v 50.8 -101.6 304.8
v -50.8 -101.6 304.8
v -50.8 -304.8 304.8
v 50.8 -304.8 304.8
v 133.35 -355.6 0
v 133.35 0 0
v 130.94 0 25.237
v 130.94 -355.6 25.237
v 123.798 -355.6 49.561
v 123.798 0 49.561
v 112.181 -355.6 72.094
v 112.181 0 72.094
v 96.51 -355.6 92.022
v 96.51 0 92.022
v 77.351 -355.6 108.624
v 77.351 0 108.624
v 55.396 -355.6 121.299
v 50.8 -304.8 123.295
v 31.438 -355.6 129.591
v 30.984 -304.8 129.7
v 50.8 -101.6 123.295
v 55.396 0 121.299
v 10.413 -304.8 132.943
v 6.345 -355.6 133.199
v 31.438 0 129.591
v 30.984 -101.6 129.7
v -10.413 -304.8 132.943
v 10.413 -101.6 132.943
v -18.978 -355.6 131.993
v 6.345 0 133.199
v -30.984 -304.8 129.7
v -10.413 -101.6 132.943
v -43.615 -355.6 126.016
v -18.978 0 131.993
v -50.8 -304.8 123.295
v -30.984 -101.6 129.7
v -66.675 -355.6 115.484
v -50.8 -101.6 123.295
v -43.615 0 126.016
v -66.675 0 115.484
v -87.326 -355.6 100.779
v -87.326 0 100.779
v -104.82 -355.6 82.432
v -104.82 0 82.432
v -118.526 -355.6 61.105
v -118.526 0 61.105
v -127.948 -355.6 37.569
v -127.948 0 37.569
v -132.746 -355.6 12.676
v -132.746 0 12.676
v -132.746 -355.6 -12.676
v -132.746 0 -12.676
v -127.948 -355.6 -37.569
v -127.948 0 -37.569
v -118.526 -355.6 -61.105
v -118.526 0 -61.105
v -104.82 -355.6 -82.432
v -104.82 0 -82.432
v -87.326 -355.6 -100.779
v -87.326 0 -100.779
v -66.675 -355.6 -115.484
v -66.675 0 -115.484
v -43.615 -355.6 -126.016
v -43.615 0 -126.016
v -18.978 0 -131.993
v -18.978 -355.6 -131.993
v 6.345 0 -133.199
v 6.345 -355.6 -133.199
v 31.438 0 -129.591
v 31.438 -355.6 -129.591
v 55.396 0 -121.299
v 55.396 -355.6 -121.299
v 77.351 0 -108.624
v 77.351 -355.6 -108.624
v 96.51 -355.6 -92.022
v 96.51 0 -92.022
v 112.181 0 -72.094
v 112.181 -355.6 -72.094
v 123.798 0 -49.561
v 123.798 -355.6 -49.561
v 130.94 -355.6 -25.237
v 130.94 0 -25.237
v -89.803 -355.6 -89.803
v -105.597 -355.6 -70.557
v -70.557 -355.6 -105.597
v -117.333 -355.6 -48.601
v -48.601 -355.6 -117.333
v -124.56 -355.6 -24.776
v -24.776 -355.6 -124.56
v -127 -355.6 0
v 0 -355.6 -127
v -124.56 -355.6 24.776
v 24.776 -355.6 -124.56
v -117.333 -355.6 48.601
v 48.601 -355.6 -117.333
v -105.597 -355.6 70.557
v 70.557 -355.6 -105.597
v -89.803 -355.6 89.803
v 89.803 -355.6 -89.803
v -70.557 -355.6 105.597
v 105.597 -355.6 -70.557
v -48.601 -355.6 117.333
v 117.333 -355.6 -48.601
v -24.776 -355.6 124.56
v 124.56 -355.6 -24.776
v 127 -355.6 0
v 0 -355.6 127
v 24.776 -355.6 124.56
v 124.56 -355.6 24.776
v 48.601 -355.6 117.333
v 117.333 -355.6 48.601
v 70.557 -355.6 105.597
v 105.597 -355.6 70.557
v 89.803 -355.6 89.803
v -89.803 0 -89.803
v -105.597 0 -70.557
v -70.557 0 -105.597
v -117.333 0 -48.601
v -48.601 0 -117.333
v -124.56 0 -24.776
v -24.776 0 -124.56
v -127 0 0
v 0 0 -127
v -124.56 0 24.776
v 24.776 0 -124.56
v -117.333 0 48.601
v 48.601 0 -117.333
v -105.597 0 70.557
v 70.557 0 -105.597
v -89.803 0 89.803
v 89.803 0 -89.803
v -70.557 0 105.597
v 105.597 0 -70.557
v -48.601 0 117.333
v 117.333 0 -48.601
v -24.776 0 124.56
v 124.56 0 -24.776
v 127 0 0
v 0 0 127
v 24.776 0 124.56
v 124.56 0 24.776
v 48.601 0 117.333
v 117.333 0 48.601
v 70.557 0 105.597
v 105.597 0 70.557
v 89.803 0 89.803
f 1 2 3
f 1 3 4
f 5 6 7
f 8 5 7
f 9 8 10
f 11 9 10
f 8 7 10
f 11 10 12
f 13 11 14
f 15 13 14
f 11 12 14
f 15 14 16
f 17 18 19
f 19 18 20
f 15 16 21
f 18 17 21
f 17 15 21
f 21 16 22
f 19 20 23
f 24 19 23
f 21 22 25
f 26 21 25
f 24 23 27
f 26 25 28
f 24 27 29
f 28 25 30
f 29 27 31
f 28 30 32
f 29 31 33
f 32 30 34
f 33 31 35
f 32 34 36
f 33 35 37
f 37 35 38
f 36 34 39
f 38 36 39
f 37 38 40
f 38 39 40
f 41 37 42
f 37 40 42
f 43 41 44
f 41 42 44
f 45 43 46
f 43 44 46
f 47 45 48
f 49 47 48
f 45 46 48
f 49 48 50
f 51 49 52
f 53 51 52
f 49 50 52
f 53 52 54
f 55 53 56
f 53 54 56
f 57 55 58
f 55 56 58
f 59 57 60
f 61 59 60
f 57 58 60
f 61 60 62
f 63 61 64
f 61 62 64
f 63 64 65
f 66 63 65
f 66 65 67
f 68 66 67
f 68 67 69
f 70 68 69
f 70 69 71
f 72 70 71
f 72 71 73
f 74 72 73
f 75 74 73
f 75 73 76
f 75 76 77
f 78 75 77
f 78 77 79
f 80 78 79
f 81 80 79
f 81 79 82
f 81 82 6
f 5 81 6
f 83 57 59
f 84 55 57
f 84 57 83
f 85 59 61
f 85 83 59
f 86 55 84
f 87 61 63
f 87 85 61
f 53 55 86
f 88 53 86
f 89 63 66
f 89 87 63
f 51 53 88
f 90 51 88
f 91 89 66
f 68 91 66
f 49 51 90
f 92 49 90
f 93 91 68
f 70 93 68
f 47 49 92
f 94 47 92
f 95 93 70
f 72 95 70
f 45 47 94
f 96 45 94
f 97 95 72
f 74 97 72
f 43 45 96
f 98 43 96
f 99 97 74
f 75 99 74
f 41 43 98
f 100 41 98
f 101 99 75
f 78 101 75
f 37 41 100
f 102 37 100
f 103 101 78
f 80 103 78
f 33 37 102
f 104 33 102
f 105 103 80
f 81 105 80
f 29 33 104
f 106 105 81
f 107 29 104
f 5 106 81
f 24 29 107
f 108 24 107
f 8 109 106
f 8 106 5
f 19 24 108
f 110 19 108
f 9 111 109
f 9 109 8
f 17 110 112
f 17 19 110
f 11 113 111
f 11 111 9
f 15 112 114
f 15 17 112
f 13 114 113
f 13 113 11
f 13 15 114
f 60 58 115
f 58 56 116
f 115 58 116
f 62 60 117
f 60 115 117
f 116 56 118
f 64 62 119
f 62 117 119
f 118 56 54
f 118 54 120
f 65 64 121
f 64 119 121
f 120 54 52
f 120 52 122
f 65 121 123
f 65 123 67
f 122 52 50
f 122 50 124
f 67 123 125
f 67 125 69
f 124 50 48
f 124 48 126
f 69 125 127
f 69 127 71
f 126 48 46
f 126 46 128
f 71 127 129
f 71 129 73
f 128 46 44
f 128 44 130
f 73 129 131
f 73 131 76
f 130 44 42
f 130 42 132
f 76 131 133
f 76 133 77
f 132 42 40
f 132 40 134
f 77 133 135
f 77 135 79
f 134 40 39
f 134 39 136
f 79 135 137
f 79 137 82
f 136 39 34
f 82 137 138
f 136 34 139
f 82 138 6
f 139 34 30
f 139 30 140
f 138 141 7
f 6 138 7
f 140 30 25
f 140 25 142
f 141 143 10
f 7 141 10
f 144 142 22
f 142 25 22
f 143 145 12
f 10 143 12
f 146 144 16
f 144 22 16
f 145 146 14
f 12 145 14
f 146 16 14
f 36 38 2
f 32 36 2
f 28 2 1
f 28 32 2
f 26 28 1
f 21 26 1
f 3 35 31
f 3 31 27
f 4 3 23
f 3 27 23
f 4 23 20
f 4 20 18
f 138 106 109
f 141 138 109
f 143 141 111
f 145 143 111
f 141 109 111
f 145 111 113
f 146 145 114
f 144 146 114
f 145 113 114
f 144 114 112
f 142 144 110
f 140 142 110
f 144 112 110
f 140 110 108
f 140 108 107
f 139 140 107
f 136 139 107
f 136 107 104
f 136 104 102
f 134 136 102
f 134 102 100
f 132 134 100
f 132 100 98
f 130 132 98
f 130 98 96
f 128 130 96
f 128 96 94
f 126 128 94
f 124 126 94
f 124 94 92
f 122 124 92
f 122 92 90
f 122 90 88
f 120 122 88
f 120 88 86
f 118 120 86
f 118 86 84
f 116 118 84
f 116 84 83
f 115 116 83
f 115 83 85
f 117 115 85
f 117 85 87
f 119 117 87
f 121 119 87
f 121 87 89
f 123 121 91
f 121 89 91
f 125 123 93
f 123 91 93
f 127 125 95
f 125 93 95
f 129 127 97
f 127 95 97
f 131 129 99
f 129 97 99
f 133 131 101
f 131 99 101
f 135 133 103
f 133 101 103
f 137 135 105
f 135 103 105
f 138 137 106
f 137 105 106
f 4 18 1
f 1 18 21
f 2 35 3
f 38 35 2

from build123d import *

# Parameters (mm, degrees)
F0_R     = 133.35
F1_DEPTH = 355.6
F2_W     = 101.6
F2_H     = 203.2
F3_DEPTH = 304.8
F4_R     = 127
F5_DEPTH = 355.601


with BuildPart() as f1:
    # F0 (on Front) → F1 (new body)
    with BuildSketch(Plane.XZ):
        Circle(F0_R)
    extrude(amount=F1_DEPTH)

    # F2 (on Top) → F3 (join)
    with BuildSketch(Plane.XY):
        with Locations((0, -203.2)):
            Rectangle(F2_W, F2_H)
    extrude(amount=F3_DEPTH)

    # F4 (on face) → F5 (cut, through all)
    with BuildSketch(Plane.XZ.offset(355.6)):
        Circle(F4_R)
    extrude(amount=-F5_DEPTH, mode=Mode.SUBTRACT)


solid = f1.part
